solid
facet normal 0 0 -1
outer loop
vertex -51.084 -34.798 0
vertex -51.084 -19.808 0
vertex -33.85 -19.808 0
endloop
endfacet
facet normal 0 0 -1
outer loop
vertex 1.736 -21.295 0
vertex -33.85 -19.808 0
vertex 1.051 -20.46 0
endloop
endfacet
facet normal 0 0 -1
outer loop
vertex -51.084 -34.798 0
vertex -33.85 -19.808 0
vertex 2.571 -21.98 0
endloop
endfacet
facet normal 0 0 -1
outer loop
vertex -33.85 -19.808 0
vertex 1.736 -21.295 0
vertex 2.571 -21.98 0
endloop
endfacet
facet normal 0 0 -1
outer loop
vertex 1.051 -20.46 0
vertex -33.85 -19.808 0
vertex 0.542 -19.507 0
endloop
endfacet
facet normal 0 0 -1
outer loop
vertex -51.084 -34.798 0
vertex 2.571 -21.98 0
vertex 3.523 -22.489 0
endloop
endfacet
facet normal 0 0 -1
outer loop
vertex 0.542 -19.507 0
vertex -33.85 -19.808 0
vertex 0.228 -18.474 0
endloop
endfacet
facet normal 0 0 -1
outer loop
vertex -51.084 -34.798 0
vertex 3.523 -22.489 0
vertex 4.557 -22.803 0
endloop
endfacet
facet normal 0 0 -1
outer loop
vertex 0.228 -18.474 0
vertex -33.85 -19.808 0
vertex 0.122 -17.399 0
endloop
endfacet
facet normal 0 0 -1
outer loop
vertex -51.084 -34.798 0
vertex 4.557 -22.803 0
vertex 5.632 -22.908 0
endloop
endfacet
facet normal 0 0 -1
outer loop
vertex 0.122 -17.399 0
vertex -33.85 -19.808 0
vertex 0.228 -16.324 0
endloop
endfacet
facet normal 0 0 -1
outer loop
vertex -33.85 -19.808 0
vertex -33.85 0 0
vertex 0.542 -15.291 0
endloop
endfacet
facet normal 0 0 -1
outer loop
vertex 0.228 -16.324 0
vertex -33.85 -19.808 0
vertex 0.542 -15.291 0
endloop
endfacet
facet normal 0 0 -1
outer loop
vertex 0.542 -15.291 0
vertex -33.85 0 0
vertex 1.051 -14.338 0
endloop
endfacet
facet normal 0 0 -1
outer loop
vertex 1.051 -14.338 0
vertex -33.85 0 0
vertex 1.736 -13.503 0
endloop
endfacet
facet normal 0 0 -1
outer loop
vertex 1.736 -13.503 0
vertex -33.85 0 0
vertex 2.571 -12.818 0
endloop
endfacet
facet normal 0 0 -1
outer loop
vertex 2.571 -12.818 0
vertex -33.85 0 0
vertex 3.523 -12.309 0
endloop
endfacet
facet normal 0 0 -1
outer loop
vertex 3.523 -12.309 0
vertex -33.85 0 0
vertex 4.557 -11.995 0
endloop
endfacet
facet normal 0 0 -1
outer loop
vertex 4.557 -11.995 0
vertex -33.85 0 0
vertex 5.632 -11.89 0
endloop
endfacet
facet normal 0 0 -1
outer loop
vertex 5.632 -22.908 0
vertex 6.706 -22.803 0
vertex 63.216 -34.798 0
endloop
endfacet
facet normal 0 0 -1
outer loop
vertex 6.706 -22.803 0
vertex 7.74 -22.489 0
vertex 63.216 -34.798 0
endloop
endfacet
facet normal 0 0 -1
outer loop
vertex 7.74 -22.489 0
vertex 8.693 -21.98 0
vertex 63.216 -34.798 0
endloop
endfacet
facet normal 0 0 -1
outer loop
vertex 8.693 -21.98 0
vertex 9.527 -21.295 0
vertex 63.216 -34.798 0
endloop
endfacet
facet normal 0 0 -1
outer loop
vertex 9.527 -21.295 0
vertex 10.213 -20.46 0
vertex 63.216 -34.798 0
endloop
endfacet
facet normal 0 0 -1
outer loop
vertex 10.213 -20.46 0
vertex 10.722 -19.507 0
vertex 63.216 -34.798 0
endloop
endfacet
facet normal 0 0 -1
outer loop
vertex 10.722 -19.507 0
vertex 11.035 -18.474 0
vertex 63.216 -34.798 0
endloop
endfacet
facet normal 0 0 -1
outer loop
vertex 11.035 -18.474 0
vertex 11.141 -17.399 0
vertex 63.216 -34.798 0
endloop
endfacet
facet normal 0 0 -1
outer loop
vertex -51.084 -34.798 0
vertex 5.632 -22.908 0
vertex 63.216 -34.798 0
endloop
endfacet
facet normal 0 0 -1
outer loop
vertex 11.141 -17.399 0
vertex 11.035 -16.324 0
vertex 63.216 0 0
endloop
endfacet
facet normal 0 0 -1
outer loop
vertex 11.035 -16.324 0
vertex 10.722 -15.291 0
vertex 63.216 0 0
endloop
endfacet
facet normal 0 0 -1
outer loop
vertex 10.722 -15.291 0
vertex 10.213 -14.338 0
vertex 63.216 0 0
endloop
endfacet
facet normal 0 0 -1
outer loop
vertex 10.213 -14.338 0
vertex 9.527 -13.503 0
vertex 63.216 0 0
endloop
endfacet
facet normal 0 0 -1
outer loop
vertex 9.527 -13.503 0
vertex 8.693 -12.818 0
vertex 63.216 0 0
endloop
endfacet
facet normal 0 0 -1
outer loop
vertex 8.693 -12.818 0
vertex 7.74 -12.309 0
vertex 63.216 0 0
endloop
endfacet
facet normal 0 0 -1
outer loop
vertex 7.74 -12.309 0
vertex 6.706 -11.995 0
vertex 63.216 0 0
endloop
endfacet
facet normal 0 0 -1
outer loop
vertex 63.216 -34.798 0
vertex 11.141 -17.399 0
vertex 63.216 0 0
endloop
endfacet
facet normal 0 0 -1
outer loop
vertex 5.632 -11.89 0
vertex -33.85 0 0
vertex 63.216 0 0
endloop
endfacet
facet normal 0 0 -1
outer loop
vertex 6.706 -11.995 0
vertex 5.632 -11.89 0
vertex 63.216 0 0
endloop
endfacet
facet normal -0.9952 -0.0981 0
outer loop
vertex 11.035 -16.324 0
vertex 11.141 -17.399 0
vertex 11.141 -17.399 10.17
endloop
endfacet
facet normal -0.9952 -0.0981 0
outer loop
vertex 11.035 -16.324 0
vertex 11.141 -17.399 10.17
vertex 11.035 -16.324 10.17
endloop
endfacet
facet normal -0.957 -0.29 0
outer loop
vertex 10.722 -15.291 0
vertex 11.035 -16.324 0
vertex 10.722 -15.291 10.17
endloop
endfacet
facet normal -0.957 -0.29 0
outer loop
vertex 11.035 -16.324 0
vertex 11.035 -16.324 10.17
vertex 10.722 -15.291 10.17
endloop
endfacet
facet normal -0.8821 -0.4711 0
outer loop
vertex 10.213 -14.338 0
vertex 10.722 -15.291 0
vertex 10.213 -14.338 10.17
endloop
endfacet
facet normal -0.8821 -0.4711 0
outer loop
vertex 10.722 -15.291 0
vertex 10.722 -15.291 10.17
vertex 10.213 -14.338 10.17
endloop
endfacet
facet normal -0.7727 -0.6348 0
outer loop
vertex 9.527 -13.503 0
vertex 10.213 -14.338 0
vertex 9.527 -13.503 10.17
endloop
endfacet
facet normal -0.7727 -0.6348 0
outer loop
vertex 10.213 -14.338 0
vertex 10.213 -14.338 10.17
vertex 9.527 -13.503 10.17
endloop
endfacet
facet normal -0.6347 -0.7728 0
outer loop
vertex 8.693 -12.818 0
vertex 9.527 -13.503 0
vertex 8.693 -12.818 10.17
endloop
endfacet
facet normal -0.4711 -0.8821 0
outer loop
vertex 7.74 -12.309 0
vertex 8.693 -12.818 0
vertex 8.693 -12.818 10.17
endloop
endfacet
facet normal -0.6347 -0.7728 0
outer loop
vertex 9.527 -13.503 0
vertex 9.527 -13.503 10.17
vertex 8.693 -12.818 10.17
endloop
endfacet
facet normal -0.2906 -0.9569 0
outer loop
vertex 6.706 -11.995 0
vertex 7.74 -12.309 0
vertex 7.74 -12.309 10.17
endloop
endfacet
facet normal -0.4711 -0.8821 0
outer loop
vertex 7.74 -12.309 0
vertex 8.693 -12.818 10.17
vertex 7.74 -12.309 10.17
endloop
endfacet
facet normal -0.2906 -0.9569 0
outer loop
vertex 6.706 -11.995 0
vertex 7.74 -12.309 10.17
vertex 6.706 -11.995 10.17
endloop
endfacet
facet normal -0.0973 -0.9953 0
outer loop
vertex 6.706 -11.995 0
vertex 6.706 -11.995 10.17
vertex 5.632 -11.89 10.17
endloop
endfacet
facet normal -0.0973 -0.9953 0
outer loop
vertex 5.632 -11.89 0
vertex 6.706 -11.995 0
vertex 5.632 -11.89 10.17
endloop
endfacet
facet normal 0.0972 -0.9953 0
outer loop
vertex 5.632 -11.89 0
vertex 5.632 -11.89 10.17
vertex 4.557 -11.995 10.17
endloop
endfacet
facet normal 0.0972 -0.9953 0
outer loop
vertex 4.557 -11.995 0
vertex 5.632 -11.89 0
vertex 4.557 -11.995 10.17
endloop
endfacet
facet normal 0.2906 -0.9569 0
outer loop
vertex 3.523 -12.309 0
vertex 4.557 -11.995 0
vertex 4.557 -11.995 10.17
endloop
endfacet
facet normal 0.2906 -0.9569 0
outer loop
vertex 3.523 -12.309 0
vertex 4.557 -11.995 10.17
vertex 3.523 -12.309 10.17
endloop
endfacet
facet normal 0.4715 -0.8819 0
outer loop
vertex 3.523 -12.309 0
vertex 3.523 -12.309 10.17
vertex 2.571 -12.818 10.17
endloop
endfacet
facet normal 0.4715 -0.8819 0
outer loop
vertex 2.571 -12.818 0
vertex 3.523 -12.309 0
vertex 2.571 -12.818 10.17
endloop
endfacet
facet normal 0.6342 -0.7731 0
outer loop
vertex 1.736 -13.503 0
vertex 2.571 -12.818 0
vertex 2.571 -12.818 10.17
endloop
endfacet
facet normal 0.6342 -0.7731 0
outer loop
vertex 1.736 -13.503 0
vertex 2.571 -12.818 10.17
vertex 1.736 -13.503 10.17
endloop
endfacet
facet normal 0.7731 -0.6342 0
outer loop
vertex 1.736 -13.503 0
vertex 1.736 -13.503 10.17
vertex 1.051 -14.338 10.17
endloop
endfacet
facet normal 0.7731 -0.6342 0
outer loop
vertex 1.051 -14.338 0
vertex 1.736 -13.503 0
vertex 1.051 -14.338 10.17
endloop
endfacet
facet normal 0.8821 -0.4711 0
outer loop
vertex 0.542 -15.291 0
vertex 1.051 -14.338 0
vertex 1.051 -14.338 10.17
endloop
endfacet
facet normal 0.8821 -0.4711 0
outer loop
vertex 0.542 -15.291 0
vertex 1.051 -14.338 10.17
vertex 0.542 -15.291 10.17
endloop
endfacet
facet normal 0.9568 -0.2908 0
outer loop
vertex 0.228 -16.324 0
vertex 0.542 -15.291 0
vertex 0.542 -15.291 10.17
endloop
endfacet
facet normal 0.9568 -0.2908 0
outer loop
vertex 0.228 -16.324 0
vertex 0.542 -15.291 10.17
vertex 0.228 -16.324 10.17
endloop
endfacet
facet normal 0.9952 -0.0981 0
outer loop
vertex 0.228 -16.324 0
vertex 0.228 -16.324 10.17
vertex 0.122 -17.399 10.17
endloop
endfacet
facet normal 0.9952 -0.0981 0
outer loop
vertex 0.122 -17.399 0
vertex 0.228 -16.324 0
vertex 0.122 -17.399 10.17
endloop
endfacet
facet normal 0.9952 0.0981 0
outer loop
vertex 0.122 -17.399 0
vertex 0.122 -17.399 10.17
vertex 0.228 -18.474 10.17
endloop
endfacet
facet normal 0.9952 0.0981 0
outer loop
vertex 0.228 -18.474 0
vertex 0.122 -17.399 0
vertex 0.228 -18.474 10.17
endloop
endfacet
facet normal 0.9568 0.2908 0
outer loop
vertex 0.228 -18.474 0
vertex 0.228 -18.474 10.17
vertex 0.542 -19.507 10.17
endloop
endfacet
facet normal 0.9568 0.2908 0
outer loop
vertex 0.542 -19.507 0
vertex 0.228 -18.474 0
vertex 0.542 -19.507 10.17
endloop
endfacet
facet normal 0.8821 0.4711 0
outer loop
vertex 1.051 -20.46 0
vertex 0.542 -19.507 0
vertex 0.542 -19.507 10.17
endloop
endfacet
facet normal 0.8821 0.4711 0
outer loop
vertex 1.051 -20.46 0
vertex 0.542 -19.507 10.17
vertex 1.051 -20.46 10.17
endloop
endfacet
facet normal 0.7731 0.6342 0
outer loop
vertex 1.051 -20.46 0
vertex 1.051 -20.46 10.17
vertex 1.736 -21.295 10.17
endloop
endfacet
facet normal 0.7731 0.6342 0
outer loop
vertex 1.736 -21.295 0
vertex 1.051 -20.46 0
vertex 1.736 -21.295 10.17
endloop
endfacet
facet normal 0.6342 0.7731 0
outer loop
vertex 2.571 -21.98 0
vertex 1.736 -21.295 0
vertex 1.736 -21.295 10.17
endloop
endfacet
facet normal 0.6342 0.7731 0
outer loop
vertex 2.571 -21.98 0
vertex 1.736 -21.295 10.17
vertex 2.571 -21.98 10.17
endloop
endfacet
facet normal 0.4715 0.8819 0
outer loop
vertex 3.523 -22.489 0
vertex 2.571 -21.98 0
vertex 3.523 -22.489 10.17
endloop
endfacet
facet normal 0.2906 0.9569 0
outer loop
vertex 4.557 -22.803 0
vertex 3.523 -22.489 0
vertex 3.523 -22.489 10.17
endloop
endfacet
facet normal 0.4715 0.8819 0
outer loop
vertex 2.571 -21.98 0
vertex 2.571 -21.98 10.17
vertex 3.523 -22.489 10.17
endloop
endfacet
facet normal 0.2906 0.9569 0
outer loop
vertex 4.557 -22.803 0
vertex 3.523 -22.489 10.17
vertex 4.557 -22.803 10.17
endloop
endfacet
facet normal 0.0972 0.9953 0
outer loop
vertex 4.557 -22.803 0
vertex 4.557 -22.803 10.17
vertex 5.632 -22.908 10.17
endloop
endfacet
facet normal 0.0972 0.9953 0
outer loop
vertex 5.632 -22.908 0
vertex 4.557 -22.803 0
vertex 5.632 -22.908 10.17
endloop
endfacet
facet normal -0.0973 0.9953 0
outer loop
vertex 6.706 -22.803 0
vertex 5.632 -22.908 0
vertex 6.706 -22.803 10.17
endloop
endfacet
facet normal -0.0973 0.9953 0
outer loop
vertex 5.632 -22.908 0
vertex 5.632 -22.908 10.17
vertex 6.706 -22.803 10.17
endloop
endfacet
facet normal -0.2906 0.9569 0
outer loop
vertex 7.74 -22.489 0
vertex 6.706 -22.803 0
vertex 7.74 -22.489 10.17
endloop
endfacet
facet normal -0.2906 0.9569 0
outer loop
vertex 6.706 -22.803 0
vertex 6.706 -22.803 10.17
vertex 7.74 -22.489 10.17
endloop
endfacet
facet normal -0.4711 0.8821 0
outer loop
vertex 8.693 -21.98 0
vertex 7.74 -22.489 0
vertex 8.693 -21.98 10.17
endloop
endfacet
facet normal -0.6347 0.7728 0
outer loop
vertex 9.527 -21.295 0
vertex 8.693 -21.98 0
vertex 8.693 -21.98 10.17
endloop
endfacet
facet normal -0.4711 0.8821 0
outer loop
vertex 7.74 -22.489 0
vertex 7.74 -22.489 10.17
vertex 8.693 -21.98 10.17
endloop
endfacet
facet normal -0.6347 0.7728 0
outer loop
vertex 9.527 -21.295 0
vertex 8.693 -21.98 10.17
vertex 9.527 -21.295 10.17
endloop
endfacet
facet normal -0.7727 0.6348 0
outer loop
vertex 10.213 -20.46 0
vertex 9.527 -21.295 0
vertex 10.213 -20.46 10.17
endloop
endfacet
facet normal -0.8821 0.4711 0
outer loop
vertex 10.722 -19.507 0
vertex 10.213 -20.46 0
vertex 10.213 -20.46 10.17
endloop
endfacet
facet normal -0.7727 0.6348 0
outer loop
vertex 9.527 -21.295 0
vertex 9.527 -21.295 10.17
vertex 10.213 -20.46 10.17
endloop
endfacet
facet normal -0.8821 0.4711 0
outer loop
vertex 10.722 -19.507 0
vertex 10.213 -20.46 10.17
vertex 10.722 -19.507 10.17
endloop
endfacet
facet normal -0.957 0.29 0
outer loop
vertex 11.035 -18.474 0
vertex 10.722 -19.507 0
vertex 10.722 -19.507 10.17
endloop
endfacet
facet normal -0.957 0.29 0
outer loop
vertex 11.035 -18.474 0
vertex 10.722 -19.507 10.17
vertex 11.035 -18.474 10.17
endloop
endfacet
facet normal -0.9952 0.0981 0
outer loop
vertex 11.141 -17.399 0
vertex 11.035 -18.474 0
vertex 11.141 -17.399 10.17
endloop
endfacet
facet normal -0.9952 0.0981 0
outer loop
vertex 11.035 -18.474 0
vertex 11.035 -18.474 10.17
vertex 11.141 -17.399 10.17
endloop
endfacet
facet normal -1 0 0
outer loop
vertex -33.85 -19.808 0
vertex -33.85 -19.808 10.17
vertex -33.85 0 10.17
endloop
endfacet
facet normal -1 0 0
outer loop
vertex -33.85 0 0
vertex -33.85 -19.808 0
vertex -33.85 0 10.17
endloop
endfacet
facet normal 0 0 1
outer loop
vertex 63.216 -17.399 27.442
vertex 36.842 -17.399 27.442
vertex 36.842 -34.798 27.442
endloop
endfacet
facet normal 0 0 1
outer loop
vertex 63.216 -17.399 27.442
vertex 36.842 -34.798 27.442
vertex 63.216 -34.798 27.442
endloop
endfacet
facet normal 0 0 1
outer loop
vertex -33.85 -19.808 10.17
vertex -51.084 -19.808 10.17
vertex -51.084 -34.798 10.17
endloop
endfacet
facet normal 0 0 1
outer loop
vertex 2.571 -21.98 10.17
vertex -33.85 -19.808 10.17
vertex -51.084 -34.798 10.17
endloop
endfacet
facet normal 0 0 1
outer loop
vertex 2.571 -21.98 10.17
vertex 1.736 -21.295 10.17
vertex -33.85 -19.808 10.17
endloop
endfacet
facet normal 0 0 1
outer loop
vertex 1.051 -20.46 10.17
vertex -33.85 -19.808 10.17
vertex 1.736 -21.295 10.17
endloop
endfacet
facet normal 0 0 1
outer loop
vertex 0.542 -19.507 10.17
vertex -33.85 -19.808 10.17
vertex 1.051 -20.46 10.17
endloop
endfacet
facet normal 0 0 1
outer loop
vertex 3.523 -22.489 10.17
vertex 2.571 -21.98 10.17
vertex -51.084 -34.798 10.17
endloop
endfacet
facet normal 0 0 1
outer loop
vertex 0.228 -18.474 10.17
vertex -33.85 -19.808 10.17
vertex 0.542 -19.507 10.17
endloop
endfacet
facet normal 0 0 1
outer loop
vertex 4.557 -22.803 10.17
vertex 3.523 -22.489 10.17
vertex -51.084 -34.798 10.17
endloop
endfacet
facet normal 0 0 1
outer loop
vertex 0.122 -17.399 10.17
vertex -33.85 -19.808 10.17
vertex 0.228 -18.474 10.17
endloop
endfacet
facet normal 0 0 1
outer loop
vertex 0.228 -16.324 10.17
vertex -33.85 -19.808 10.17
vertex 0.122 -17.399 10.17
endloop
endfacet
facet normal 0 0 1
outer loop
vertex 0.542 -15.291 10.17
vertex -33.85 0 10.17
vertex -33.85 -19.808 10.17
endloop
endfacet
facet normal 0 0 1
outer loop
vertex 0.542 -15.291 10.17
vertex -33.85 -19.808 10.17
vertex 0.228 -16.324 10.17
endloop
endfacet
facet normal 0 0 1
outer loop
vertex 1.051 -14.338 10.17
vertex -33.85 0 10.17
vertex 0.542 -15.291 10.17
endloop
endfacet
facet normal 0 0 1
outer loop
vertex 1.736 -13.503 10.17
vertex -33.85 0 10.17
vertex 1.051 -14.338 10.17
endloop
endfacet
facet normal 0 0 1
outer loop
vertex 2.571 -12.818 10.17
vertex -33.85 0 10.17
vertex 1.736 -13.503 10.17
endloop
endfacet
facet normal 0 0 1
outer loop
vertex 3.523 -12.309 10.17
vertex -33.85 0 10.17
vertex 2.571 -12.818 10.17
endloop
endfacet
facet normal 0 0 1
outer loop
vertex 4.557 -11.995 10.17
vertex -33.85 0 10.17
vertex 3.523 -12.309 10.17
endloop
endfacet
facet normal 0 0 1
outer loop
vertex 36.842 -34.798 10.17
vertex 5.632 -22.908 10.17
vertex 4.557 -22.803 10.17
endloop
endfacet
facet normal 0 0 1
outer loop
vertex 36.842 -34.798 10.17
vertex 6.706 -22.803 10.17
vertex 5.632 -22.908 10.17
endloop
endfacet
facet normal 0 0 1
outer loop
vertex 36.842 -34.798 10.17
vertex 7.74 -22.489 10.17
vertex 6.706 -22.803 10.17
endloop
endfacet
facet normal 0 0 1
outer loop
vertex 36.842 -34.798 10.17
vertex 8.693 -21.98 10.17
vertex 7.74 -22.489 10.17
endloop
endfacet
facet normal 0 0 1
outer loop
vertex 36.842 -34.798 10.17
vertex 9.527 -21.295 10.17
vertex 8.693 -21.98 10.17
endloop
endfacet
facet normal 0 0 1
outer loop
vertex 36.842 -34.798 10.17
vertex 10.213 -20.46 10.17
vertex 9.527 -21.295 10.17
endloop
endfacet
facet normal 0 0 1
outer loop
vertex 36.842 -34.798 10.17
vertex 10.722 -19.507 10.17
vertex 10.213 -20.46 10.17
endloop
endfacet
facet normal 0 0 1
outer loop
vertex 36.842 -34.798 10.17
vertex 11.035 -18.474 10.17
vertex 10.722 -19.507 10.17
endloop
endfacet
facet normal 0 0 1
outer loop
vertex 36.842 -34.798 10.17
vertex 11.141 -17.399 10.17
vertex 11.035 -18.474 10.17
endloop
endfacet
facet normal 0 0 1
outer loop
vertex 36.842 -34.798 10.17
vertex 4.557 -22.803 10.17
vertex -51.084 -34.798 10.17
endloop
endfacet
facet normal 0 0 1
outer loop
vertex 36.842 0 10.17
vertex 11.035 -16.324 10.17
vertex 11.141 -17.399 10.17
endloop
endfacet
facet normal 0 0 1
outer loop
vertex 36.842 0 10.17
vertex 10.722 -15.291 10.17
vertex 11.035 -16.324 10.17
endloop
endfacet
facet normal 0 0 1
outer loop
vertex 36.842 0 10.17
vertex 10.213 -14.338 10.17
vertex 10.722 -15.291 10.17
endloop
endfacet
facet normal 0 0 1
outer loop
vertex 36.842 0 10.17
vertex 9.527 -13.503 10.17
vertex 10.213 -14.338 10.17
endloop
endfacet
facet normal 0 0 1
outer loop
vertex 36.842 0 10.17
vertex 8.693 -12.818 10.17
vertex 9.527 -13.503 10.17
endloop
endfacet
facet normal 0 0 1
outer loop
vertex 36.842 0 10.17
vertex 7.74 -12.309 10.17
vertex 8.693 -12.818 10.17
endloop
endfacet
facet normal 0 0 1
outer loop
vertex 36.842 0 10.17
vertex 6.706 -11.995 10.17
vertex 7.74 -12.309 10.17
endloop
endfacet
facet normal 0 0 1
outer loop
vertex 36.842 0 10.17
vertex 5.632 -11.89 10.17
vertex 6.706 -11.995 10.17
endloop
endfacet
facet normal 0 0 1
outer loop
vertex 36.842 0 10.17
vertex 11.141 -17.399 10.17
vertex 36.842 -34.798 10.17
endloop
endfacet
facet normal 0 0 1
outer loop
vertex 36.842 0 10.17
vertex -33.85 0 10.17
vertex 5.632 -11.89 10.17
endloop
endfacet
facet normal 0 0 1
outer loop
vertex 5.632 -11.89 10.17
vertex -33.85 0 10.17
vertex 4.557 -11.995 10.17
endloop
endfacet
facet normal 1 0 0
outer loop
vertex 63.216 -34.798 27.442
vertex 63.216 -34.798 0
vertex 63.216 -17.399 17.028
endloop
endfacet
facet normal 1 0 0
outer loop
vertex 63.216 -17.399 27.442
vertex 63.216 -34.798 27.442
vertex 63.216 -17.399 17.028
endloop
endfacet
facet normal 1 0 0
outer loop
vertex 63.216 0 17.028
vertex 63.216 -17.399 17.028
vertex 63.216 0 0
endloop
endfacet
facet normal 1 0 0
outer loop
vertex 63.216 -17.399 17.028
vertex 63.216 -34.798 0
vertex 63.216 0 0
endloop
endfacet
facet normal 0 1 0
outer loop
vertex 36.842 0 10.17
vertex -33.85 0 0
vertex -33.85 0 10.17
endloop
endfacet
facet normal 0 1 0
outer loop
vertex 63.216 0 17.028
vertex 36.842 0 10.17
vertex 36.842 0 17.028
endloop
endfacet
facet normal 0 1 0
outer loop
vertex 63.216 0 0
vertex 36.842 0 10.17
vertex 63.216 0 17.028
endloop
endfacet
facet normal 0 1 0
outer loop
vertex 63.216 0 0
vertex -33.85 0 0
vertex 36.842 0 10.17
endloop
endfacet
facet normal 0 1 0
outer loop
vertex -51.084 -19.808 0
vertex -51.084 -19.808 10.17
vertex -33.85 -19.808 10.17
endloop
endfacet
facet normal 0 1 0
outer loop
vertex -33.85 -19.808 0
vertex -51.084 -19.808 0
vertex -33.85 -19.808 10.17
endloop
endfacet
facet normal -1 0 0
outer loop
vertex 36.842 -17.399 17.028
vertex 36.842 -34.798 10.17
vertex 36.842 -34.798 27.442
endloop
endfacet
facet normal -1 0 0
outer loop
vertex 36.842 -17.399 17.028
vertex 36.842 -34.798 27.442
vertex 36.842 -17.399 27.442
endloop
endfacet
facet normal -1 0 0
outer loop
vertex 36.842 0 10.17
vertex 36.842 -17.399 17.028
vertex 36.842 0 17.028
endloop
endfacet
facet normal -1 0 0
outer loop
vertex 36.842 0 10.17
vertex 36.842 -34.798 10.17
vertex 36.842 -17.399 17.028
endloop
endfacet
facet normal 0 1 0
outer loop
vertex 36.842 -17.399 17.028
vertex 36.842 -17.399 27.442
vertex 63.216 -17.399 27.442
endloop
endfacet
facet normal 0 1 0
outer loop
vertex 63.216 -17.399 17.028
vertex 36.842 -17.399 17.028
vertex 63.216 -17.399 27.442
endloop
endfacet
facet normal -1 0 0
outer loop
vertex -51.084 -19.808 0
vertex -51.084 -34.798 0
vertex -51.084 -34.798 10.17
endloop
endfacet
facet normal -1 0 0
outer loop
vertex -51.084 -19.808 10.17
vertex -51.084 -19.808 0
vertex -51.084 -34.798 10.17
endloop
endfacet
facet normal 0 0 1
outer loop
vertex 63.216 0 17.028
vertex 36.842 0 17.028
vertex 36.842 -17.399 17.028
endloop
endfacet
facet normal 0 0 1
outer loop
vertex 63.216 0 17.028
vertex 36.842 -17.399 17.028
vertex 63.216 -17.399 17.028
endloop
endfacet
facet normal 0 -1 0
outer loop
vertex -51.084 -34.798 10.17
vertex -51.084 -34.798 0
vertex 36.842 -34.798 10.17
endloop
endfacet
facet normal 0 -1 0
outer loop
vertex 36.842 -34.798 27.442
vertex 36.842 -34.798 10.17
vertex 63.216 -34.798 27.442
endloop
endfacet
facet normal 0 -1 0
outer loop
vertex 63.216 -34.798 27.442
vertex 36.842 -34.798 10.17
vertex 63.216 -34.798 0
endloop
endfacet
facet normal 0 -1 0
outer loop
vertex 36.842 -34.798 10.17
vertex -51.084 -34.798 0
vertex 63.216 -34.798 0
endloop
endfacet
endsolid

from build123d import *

# Parameters (mm, degrees)
F0_W     = 114.3
F0_H     = 10.170036
F1_DEPTH = 34.798
F2_W     = 17.233886
F2_H     = 19.807858
F3_DEPTH = 25.4
F4_W     = 26.374524
F4_H     = 34.798
F5_DEPTH = 17.272
F6_W     = 26.374524
F6_H     = 17.399
F7_DEPTH = 10.414
F8_R     = 5.509405
F9_DEPTH = 35.56


with BuildPart() as f1:
    # F0 (on Front) → F1 (new body)
    with BuildSketch(Plane.XZ):
        with Locations((6.0662, 5.085018)):
            Rectangle(F0_W, F0_H)
    extrude(amount=F1_DEPTH)

    # F2 (on face) → F3 (cut)
    with BuildSketch(Plane.XY.offset(10.170036)):
        with Locations((-42.466857, -9.903929)):
            Rectangle(F2_W, F2_H)
    extrude(amount=-F3_DEPTH, mode=Mode.SUBTRACT)

    # F4 (on face) → F5 (join)
    with BuildSketch(Plane.XY.offset(10.170036)):
        with Locations((50.028938, -17.399)):
            Rectangle(F4_W, F4_H)
    extrude(amount=F5_DEPTH)

    # F6 (on face) → F7 (cut)
    with BuildSketch(Plane.XY.offset(27.442036)):
        with Locations((50.028938, -8.6995)):
            Rectangle(F6_W, F6_H)
    extrude(amount=-F7_DEPTH, mode=Mode.SUBTRACT)

    # F8 (on face) → F9 (cut)
    with BuildSketch(Plane.XY.offset(10.170036)):
        with Locations((5.631648, -17.399)):
            Circle(F8_R)
    extrude(amount=-F9_DEPTH, mode=Mode.SUBTRACT)


solid = f1.part
